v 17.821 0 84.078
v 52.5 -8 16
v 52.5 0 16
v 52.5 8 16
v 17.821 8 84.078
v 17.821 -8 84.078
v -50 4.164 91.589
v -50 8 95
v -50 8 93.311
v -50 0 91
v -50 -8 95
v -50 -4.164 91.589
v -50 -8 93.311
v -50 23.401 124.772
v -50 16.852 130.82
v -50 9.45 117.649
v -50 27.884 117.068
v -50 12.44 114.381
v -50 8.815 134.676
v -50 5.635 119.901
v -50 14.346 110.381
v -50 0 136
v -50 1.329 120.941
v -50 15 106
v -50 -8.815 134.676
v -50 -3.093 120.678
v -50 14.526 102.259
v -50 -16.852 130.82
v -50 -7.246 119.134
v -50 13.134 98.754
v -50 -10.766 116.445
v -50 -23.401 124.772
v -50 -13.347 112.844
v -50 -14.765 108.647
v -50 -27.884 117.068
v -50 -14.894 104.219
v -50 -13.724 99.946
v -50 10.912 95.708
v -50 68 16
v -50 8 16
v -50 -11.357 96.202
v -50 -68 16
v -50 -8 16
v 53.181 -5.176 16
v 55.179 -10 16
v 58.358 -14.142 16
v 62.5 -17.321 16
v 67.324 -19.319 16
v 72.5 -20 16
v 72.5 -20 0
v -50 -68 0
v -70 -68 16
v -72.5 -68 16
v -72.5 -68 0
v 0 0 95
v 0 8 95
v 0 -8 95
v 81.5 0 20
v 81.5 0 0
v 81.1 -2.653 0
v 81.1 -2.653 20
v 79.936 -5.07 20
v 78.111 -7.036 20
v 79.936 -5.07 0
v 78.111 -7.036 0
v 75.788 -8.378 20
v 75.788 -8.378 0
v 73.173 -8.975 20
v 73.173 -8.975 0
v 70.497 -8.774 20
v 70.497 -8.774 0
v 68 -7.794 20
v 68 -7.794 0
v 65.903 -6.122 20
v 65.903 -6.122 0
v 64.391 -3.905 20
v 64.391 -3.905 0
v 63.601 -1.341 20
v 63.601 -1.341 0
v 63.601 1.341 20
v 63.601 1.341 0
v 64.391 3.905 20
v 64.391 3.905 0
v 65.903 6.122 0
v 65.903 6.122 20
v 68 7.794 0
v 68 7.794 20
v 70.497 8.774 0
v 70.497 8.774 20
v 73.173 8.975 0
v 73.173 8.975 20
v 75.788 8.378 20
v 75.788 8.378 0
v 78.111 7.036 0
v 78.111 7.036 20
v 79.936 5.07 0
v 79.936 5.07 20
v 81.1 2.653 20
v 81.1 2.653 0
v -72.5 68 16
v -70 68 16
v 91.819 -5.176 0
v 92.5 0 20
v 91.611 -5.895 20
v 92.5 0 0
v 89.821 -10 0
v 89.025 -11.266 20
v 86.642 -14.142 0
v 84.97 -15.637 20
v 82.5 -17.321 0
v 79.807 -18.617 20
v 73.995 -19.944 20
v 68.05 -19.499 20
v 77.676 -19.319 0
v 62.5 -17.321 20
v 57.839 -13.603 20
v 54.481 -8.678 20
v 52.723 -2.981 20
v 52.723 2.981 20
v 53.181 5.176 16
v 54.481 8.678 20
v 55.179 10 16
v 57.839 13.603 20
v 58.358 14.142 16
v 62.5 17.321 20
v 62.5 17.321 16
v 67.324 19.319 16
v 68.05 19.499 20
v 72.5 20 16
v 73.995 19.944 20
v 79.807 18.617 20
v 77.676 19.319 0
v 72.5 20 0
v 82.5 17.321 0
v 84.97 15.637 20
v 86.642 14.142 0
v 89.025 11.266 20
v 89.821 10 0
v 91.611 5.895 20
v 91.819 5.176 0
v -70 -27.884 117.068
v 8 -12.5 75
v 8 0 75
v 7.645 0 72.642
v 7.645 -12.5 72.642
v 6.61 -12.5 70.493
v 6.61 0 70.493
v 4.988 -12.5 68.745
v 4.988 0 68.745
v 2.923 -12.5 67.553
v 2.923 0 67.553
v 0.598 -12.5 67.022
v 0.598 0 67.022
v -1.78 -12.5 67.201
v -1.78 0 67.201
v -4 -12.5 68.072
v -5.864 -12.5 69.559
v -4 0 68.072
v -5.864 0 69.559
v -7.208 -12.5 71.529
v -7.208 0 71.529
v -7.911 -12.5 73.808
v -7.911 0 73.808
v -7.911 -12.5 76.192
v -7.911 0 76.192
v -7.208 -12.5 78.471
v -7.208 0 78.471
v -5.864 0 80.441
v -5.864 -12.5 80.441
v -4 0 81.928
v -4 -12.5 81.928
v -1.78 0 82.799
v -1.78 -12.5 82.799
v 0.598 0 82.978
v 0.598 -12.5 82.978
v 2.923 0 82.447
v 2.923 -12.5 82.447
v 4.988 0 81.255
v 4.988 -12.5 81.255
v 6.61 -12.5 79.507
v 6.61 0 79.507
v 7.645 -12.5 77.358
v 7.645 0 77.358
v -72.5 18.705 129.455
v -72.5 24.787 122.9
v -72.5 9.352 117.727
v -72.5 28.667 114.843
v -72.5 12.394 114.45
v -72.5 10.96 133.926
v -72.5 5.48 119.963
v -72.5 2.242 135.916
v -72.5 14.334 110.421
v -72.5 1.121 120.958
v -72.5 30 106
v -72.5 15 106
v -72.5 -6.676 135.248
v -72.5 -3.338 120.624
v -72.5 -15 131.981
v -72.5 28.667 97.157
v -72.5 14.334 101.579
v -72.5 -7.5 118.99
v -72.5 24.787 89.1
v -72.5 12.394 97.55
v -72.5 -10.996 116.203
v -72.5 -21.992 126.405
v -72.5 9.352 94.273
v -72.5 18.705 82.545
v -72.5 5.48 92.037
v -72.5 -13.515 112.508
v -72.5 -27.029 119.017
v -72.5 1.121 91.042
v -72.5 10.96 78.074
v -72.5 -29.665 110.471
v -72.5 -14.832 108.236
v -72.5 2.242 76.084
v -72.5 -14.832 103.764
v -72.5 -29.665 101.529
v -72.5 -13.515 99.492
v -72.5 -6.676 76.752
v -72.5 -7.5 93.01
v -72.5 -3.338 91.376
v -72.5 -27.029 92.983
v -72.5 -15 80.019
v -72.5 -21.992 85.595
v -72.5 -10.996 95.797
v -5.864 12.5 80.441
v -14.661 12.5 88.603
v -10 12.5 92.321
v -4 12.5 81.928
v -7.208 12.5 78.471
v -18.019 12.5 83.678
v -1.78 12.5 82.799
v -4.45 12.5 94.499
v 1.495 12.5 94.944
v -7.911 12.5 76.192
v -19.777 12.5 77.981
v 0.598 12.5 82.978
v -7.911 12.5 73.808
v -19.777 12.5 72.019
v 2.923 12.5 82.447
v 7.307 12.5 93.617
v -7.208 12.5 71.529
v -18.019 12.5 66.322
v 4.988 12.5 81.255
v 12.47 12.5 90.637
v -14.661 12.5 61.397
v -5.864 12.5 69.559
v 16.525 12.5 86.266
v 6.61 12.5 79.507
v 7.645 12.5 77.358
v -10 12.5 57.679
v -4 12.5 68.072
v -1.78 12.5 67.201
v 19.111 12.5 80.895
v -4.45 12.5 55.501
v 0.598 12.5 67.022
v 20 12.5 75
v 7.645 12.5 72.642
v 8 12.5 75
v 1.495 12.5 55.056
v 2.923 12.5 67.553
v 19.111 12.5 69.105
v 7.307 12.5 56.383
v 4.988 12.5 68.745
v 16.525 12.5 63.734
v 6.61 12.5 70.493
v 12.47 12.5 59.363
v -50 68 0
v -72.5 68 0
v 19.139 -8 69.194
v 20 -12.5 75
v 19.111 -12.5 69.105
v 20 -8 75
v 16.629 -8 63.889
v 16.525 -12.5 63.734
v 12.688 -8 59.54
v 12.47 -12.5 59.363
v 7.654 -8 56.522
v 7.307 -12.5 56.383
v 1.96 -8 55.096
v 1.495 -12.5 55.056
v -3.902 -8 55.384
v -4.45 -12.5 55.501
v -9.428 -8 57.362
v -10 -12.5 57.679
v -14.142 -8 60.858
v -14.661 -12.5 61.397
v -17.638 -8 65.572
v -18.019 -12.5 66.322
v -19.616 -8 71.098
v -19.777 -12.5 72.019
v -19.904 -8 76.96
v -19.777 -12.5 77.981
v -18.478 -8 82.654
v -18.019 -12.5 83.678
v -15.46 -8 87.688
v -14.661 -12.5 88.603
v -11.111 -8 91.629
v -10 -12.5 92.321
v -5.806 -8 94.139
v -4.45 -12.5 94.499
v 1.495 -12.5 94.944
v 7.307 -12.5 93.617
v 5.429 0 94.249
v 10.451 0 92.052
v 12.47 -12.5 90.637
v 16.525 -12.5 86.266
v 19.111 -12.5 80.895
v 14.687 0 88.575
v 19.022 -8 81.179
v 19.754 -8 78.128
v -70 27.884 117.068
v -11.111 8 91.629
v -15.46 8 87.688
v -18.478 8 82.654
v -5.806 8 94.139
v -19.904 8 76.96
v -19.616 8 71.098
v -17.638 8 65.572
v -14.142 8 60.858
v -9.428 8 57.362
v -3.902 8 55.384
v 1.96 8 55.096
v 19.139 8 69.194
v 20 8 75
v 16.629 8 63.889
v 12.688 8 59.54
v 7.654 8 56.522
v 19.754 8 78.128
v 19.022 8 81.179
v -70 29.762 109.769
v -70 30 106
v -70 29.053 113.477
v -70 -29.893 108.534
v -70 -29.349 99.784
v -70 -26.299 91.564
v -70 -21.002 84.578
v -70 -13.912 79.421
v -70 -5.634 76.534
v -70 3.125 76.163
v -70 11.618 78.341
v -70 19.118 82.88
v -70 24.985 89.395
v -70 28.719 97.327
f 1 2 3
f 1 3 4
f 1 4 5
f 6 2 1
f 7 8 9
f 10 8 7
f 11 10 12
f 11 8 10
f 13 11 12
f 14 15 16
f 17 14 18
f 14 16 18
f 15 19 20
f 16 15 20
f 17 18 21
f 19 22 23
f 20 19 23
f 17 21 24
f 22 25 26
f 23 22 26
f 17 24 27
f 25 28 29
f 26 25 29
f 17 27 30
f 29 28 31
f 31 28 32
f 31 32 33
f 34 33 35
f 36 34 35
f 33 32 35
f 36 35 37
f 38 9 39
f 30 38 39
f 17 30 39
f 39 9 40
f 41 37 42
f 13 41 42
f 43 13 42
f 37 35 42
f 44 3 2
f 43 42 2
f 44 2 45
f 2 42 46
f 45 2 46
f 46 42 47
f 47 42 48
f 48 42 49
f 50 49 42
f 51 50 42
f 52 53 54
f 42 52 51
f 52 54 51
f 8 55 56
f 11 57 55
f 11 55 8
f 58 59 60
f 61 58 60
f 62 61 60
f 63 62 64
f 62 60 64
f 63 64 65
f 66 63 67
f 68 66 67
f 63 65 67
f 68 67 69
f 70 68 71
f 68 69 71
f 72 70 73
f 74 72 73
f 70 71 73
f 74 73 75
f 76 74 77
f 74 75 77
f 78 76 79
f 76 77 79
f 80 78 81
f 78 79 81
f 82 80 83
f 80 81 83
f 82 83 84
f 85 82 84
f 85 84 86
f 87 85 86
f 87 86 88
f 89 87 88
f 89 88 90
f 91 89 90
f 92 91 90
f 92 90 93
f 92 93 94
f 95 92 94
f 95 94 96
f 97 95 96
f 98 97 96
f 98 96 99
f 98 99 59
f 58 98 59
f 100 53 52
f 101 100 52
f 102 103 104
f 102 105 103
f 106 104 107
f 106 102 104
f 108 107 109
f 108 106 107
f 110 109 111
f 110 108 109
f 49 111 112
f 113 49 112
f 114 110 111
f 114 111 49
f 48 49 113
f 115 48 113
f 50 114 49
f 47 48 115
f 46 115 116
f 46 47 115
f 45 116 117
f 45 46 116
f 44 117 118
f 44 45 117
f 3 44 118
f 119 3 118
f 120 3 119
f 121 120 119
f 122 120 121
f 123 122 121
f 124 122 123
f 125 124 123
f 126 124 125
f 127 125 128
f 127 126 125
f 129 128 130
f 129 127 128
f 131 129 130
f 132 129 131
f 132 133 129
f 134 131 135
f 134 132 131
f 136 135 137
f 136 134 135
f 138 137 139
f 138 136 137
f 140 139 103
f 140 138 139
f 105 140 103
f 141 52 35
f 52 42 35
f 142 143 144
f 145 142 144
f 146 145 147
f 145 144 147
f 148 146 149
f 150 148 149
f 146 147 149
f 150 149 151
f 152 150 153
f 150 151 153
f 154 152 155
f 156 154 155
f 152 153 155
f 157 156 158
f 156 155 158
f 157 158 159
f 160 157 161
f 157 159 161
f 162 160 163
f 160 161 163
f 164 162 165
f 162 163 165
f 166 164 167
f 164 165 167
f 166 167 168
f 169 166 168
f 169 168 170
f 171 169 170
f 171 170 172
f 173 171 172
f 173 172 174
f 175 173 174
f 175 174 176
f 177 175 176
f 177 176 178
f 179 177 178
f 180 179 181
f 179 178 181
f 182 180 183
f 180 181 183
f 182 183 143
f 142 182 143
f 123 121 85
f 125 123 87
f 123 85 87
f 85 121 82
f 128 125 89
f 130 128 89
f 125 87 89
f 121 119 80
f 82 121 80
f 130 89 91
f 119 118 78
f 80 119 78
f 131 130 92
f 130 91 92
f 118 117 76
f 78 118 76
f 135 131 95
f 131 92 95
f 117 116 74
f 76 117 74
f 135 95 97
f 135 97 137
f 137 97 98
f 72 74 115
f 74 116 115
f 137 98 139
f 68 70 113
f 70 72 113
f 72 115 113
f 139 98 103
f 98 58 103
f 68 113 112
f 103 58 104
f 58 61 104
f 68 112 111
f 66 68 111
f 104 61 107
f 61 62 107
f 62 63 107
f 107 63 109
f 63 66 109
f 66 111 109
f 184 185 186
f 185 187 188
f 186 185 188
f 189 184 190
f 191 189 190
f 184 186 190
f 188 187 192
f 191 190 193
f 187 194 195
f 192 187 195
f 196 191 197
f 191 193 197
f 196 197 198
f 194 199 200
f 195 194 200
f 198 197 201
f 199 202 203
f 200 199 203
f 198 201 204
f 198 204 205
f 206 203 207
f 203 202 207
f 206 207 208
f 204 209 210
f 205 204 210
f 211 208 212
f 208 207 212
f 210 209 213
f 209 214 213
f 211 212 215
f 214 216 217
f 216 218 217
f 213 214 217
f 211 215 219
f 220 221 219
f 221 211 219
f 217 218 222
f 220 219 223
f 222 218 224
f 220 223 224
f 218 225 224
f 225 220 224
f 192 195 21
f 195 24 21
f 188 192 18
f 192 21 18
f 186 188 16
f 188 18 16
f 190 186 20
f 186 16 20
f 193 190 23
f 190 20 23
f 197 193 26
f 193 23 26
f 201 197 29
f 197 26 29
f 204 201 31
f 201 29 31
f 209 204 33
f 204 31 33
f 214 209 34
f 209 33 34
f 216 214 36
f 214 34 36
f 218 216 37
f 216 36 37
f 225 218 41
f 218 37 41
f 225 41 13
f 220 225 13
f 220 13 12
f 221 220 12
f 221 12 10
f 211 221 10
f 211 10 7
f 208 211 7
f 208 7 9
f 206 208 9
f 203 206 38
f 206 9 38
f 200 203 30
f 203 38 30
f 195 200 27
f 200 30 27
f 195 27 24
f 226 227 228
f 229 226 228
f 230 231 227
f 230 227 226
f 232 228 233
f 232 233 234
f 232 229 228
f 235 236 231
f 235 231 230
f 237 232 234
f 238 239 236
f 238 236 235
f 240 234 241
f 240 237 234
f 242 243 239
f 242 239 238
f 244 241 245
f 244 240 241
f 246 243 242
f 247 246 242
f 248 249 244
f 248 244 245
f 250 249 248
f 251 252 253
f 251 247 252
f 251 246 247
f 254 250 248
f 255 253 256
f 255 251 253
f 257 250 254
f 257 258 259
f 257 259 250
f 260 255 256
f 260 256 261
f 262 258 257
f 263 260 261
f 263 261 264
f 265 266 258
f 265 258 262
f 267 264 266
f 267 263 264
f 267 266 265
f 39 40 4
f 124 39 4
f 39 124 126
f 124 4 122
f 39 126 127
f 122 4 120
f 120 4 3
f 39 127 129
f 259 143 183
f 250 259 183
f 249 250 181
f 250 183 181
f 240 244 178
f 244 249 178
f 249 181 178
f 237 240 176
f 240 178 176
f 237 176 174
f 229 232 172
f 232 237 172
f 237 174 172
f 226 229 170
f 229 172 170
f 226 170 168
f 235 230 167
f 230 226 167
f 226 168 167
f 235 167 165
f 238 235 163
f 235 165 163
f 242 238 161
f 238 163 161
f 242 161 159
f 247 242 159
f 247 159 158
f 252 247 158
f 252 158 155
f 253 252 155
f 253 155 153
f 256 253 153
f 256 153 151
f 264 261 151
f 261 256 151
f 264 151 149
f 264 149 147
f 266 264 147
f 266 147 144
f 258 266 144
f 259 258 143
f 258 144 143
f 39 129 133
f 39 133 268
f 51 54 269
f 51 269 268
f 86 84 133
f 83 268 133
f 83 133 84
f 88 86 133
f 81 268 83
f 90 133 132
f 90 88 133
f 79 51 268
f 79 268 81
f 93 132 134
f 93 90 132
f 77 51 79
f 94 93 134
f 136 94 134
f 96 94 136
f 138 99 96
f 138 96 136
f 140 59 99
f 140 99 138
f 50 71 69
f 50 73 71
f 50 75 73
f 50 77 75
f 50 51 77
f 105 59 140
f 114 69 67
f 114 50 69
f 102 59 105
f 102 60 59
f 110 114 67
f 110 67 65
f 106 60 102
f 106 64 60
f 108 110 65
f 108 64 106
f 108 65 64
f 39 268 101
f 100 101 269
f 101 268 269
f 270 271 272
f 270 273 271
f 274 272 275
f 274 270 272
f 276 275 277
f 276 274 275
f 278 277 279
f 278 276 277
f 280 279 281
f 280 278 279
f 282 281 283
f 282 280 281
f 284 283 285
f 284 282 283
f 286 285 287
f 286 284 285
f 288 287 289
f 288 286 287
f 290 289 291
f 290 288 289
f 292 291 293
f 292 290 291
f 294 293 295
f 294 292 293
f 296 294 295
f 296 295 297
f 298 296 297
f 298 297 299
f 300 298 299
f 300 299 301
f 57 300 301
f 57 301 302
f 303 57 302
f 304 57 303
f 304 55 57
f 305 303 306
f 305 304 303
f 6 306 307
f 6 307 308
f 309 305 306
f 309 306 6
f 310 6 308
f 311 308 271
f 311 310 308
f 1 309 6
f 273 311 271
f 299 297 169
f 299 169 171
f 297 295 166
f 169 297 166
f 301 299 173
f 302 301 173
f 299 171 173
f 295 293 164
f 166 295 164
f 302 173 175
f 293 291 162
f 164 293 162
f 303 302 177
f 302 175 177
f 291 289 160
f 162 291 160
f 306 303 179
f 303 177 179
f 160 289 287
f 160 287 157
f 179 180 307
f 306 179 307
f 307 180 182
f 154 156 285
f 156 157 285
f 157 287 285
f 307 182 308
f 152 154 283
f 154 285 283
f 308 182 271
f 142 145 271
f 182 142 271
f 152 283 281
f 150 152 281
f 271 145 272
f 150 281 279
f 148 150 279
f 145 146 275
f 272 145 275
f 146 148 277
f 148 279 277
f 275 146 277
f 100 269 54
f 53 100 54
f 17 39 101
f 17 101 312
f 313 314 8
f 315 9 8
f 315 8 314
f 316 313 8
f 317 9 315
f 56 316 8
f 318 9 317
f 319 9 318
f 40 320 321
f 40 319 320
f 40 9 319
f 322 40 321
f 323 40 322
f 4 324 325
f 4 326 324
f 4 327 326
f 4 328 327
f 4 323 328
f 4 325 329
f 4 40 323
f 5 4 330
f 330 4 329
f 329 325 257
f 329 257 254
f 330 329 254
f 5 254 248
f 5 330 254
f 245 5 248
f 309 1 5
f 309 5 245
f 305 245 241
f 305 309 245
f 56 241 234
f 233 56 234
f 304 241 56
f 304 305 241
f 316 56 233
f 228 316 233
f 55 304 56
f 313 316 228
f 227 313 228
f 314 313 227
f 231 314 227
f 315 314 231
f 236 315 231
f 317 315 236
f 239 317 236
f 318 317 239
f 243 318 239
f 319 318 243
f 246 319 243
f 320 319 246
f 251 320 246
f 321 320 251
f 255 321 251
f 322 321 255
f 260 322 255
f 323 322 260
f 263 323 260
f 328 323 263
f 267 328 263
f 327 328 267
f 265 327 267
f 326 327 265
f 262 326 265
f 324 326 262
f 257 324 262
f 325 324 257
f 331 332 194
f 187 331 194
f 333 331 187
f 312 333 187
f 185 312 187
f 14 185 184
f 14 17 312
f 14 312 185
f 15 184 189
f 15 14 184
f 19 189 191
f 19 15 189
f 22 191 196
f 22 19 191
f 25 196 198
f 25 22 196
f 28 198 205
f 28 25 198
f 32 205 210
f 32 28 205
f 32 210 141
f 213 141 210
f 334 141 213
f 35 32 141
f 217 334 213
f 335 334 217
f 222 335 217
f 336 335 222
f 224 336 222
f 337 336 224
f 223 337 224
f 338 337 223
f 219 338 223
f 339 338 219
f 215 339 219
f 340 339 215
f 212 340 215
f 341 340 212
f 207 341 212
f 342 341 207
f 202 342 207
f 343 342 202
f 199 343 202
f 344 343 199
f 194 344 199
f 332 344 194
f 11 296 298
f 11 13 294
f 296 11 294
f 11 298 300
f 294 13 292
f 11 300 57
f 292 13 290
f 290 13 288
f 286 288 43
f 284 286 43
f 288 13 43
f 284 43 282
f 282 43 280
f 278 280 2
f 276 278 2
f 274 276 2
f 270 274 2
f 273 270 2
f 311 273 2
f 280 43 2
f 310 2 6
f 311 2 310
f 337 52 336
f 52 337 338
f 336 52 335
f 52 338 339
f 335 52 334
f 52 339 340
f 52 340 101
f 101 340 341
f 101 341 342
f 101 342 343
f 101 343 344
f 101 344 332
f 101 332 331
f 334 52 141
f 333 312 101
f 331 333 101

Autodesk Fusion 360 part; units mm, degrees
sketch "Sketch1" plane through (0, 0, 0) normal (0, 0, 1) x (1, 0, 0)
  line L0 (72.5, 68) -> (-72.5, 68)
  line L1 (-72.5, 68) -> (-72.5, -68)
  line L2 (-72.5, -68) -> (72.5, -68)
  line L3 (72.5, -68) -> (72.5, 68)
  line L4 (72.5, 68) -> (-72.5, -68) construction
  line L5 (-72.5, 68) -> (72.5, -68) construction
  dimension "d2" = 145
  dimension "d3" = 136
extrude "Extrude1" add sketch "Sketch1" along normal blind 136 makes body 1
sketch "Sketch2" plane through (0, -68, 0) normal (0, -1, 0) x (1, 0, 0)
  line L0 (-72.5, 0) -> (72.5, 0)
  line L1 (72.5, 0) -> (72.5, 136)
  line L2 (72.5, 136) -> (-72.5, 136)
  line L3 (-72.5, 136) -> (-72.5, 0)
  line L4 (-72.5, 136) -> (-50, 136)
  line L5 (-50, 136) -> (-50, 16)
  line L6 (-50, 16) -> (72.5, 16)
  line L7 (72.5, 0) -> (-72.5, 0)
  line L8 (72.5, 16) -> (72.5, 0)
  line L9 (-72.5, 0) -> (-72.5, 136)
  dimension "d6" = 136
  dimension "d7" = 16
extrude "Extrude2" cut sketch "Sketch2" against normal blind 290 contours L1 L2 L5 L6 bodies 1
sketch "Sketch3" plane through (-50, 0, 0) normal (1, 0, 0) x (0, 1, 0)
  line L0 (68, 16) -> (68, 136)
  line L1 (68, 136) -> (-68, 136)
  line L2 (-68, 136) -> (-68, 16)
  line L3 (-68, 16) -> (68, 16)
  line L4 (-68, 109.876) -> (68, 109.876) construction
  line L5 (0, 136) -> (0, 16) construction
  circle A0 centre (0, 109.876) radius 30
  circle A1 centre (0, 109.876) radius 15
  line L6 (-30, 109.876) -> (-68, 16)
  line L7 (30, 109.876) -> (68, 16)
  dimension "d10" = 60
  dimension "d11" = 30
extrude "Extrude3" cut sketch "Sketch3" against normal blind 50 contours L0 L1 A0 L7 | L1 L2 A0 L6 bodies 1
sketch "Sketch4" plane through (-50, 0, 0) normal (1, 0, 0) x (0, 1, 0)
  arc A0 (-14.7492, 136) -> (-30, 109.876) centre (0, 109.876) ccw
  line L0 (-30, 109.876) -> (-68, 16)
  line L1 (-68, 16) -> (68, 16)
  line L2 (68, 16) -> (30, 109.876)
  arc A1 (30, 109.876) -> (14.7492, 136) centre (0, 109.876) ccw
  line L3 (14.7492, 136) -> (-14.7492, 136)
  line L4 (-20, 106) -> (20, 106) construction
  circle A2 centre (0, 106) radius 15
  circle A3 centre (0, 106) radius 30
  point P0 (-68, 0)
  dimension "d14" = 106
  dimension "d15" = 30
  dimension "d16" = 60
extrude "Extrude4" cut sketch "Sketch4" against normal blind 50 contours A2 bodies 1
sketch "Sketch5" plane through (-50, 0, 0) normal (1, 0, 0) x (0, 1, 0)
  circle A0 centre (0, 106) radius 15
  arc A1 (-14.7492, 136) -> (-30, 109.876) centre (0, 109.876) ccw
  line L0 (-30, 109.876) -> (-68, 16)
  line L1 (-68, 16) -> (68, 16)
  line L2 (68, 16) -> (30, 109.876)
  arc A2 (30, 109.876) -> (14.7492, 136) centre (0, 109.876) ccw
  line L3 (14.7492, 136) -> (-14.7492, 136)
  circle A3 centre (0, 106) radius 30
  dimension "d19" = 60
extrude "Extrude5" cut sketch "Sketch5" against normal blind 120 contours A1 L0 L1 L2 A2 L3 bodies 1 makes body 2 at (-57.5, 29.8509, 103.013)
sketch "Sketch6" plane through (-50, 0, 0) normal (1, 0, 0) x (0, 1, 0)
  circle A0 centre (0, 106) radius 30
  circle A1 centre (0, 106) radius 15
  line L0 (68, 16) -> (27.8838, 117.0677)
  line L1 (0, 0) -> (0, 136) construction
  line L2 (68, 16) -> (27.8838, 117.0677)
  line L3 (-68, 16) -> (-27.8838, 117.0677)
  line L4 (-68, 16) -> (68, 16)
extrude "Extrude6" add sketch "Sketch6" against normal blind 20 contours A0 L0 L2 L3 L4 bodies 1 2
sketch "Sketch7" plane through (0, -68, 0) normal (0, -1, 0) x (1, 0, 0)
  line L0 (72.5, 16) -> (-50, 16)
  line L1 (-50, 16) -> (-70, 16)
  line L2 (-70, 16) -> (-72.5, 16)
  line L3 (-72.5, 16) -> (-72.5, 0)
  line L4 (-72.5, 0) -> (72.5, 0)
  line L5 (72.5, 0) -> (72.5, 16)
sketch "Sketch8" plane through (0, 0, 16) normal (0, 0, 1) x (-1, 0, 0)
  line L0 (50, -68) -> (50, 68)
  line L1 (50, 68) -> (-72.5, 68)
  line L2 (-72.5, 68) -> (-72.5, -68)
  line L3 (-72.5, -68) -> (50, -68)
  line L4 (50, 0) -> (-72.5, 0) construction
  circle A0 centre (-72.5, 0) radius 9
  circle A1 centre (-72.5, 0) radius 20
  dimension "d24" = 18
  dimension "d25" = 40
extrude "Extrude7" add sketch "Sketch8" along normal blind 25 contours L2 A0 A1 | L2 A0 A1 bodies 1
sketch "Sketch9" plane through (0, 0, 16) normal (0, 0, 1) x (-1, 0, 0)
  arc A0 (-72.5, -20) -> (-72.5, 20) centre (-72.5, 0) ccw
  line L0 (-72.5, -20) -> (-72.5, -68)
  line L1 (-72.5, -68) -> (50, -68)
  line L2 (50, -68) -> (50, 68)
  line L3 (50, 68) -> (-72.5, 68)
  line L4 (-72.5, 68) -> (-72.5, 20)
  line L5 (-72.5, -20) -> (50, -68)
  line L6 (50, -68) -> (-72.5, -68)
  line L7 (-72.5, -20) -> (-72.5, -68)
extrude "Extrude8" cut sketch "Sketch9" against normal blind 40 contours L0 L1 L5 L6 L7 bodies 1
sketch "Sketch10" plane through (0, 0, 16) normal (0, 0, 1) x (-1, 0, 0)
  line L0 (-72.5, -20) -> (50, -68)
  line L1 (50, -68) -> (50, 68)
  line L2 (50, 68) -> (-72.5, 68)
  line L3 (-72.5, 68) -> (-72.5, 20)
  arc A0 (-72.5, -20) -> (-72.5, 20) centre (-72.5, 0) ccw
  line L4 (-72.5, 20) -> (50, 68)
  line L5 (50, 68) -> (-72.5, 68)
  line L6 (-72.5, 68) -> (-72.5, 20)
extrude "Extrude9" cut sketch "Sketch10" against normal blind 50 contours L2 L3 L4 L5 L6 bodies 1
sketch "Sketch11" plane through (16.4434, -41.965, 0) normal (0.3648, -0.9311, 0) x (0.9311, 0.3648, 0)
  line L0 (-71.3621, 0) -> (60.2063, 0)
  line L1 (60.2063, 0) -> (60.2063, 16)
  line L2 (60.2063, 16) -> (-71.3621, 16)
  line L3 (-71.3621, 16) -> (-71.3621, 0)
extrude "Extrude10" cut 1 faces at (68.8622, 2.5078, 16) along direction (0, 0, -1) blind 40 on bodies 1 bodies 1
extrude "Extrude11" cut 1 faces at (56.2746, 1.4407, 41) along direction (0, 0, -1) blind 50 on bodies 1 bodies 1
sketch "Sketch12" plane through (0, 0, 16) normal (0, 0, 1) x (-1, 0, 0)
  line L0 (50, 68) -> (-72.5, 20)
  arc A0 (-72.5, -20) -> (-72.5, 20) centre (-72.5, 0) ccw
  line L1 (-72.5, -20) -> (50, -68)
  line L2 (50, -68) -> (50, 68)
sketch "Sketch13" plane through (0, 0, 0) normal (0, 0, -1) x (1, 0, 0)
  arc A0 (72.5, 20) -> (72.5, -20) centre (72.5, 0) ccw
  line L0 (72.5, 20) -> (-50, 68)
  line L1 (-50, 68) -> (-72.5, 68)
  line L2 (-72.5, 68) -> (-72.5, -68)
  line L3 (-72.5, -68) -> (-50, -68)
  line L4 (-50, -68) -> (72.5, -20)
  circle A1 centre (72.5, 0) radius 9
  circle A2 centre (72.5, 0) radius 20
  dimension "d37" = 18
  dimension "d38" = 40
extrude "Extrude12" add sketch "Sketch13" against normal blind 20 contours A0 A2 bodies 1
sketch "Sketch14" plane through (0, 0, 0) normal (0, 1, 0) x (1, 0, 0)
  line L0 (0, 0) -> (0, -61) construction
  line L1 (0, -61) -> (-75, -61) construction
  circle A0 centre (0, -75) radius 8
  circle A1 centre (0, -75) radius 20
  dimension "d43" = 61
  dimension "d44" = 75
  dimension "d45" = 16
  dimension "d46" = 40
extrude "Extrude13" add sketch "Sketch14" along normal blind 12.5 and the other way blind 12.5 separate body makes body 3
sketch "Sketch15" plane through (0, -68, 0) normal (0, -1, 0) x (1, 0, 0)
sketch "Sketch16" plane through (0, 0, 0) normal (0, 1, 0) x (1, 0, 0)
  line L0 (0, -95) -> (-50, -95)
  line L1 (-50, -95) -> (-50, -16)
  line L2 (-50, -16) -> (52.5, -16)
  line L3 (52.5, -16) -> (17.821, -84.078)
  circle A0 centre (0, -75) radius 20
extrude "Extrude14" add sketch "Sketch16" along normal blind 8 and the other way blind 8 contours L0 L1 L2 L3 A0 bodies 1 3
